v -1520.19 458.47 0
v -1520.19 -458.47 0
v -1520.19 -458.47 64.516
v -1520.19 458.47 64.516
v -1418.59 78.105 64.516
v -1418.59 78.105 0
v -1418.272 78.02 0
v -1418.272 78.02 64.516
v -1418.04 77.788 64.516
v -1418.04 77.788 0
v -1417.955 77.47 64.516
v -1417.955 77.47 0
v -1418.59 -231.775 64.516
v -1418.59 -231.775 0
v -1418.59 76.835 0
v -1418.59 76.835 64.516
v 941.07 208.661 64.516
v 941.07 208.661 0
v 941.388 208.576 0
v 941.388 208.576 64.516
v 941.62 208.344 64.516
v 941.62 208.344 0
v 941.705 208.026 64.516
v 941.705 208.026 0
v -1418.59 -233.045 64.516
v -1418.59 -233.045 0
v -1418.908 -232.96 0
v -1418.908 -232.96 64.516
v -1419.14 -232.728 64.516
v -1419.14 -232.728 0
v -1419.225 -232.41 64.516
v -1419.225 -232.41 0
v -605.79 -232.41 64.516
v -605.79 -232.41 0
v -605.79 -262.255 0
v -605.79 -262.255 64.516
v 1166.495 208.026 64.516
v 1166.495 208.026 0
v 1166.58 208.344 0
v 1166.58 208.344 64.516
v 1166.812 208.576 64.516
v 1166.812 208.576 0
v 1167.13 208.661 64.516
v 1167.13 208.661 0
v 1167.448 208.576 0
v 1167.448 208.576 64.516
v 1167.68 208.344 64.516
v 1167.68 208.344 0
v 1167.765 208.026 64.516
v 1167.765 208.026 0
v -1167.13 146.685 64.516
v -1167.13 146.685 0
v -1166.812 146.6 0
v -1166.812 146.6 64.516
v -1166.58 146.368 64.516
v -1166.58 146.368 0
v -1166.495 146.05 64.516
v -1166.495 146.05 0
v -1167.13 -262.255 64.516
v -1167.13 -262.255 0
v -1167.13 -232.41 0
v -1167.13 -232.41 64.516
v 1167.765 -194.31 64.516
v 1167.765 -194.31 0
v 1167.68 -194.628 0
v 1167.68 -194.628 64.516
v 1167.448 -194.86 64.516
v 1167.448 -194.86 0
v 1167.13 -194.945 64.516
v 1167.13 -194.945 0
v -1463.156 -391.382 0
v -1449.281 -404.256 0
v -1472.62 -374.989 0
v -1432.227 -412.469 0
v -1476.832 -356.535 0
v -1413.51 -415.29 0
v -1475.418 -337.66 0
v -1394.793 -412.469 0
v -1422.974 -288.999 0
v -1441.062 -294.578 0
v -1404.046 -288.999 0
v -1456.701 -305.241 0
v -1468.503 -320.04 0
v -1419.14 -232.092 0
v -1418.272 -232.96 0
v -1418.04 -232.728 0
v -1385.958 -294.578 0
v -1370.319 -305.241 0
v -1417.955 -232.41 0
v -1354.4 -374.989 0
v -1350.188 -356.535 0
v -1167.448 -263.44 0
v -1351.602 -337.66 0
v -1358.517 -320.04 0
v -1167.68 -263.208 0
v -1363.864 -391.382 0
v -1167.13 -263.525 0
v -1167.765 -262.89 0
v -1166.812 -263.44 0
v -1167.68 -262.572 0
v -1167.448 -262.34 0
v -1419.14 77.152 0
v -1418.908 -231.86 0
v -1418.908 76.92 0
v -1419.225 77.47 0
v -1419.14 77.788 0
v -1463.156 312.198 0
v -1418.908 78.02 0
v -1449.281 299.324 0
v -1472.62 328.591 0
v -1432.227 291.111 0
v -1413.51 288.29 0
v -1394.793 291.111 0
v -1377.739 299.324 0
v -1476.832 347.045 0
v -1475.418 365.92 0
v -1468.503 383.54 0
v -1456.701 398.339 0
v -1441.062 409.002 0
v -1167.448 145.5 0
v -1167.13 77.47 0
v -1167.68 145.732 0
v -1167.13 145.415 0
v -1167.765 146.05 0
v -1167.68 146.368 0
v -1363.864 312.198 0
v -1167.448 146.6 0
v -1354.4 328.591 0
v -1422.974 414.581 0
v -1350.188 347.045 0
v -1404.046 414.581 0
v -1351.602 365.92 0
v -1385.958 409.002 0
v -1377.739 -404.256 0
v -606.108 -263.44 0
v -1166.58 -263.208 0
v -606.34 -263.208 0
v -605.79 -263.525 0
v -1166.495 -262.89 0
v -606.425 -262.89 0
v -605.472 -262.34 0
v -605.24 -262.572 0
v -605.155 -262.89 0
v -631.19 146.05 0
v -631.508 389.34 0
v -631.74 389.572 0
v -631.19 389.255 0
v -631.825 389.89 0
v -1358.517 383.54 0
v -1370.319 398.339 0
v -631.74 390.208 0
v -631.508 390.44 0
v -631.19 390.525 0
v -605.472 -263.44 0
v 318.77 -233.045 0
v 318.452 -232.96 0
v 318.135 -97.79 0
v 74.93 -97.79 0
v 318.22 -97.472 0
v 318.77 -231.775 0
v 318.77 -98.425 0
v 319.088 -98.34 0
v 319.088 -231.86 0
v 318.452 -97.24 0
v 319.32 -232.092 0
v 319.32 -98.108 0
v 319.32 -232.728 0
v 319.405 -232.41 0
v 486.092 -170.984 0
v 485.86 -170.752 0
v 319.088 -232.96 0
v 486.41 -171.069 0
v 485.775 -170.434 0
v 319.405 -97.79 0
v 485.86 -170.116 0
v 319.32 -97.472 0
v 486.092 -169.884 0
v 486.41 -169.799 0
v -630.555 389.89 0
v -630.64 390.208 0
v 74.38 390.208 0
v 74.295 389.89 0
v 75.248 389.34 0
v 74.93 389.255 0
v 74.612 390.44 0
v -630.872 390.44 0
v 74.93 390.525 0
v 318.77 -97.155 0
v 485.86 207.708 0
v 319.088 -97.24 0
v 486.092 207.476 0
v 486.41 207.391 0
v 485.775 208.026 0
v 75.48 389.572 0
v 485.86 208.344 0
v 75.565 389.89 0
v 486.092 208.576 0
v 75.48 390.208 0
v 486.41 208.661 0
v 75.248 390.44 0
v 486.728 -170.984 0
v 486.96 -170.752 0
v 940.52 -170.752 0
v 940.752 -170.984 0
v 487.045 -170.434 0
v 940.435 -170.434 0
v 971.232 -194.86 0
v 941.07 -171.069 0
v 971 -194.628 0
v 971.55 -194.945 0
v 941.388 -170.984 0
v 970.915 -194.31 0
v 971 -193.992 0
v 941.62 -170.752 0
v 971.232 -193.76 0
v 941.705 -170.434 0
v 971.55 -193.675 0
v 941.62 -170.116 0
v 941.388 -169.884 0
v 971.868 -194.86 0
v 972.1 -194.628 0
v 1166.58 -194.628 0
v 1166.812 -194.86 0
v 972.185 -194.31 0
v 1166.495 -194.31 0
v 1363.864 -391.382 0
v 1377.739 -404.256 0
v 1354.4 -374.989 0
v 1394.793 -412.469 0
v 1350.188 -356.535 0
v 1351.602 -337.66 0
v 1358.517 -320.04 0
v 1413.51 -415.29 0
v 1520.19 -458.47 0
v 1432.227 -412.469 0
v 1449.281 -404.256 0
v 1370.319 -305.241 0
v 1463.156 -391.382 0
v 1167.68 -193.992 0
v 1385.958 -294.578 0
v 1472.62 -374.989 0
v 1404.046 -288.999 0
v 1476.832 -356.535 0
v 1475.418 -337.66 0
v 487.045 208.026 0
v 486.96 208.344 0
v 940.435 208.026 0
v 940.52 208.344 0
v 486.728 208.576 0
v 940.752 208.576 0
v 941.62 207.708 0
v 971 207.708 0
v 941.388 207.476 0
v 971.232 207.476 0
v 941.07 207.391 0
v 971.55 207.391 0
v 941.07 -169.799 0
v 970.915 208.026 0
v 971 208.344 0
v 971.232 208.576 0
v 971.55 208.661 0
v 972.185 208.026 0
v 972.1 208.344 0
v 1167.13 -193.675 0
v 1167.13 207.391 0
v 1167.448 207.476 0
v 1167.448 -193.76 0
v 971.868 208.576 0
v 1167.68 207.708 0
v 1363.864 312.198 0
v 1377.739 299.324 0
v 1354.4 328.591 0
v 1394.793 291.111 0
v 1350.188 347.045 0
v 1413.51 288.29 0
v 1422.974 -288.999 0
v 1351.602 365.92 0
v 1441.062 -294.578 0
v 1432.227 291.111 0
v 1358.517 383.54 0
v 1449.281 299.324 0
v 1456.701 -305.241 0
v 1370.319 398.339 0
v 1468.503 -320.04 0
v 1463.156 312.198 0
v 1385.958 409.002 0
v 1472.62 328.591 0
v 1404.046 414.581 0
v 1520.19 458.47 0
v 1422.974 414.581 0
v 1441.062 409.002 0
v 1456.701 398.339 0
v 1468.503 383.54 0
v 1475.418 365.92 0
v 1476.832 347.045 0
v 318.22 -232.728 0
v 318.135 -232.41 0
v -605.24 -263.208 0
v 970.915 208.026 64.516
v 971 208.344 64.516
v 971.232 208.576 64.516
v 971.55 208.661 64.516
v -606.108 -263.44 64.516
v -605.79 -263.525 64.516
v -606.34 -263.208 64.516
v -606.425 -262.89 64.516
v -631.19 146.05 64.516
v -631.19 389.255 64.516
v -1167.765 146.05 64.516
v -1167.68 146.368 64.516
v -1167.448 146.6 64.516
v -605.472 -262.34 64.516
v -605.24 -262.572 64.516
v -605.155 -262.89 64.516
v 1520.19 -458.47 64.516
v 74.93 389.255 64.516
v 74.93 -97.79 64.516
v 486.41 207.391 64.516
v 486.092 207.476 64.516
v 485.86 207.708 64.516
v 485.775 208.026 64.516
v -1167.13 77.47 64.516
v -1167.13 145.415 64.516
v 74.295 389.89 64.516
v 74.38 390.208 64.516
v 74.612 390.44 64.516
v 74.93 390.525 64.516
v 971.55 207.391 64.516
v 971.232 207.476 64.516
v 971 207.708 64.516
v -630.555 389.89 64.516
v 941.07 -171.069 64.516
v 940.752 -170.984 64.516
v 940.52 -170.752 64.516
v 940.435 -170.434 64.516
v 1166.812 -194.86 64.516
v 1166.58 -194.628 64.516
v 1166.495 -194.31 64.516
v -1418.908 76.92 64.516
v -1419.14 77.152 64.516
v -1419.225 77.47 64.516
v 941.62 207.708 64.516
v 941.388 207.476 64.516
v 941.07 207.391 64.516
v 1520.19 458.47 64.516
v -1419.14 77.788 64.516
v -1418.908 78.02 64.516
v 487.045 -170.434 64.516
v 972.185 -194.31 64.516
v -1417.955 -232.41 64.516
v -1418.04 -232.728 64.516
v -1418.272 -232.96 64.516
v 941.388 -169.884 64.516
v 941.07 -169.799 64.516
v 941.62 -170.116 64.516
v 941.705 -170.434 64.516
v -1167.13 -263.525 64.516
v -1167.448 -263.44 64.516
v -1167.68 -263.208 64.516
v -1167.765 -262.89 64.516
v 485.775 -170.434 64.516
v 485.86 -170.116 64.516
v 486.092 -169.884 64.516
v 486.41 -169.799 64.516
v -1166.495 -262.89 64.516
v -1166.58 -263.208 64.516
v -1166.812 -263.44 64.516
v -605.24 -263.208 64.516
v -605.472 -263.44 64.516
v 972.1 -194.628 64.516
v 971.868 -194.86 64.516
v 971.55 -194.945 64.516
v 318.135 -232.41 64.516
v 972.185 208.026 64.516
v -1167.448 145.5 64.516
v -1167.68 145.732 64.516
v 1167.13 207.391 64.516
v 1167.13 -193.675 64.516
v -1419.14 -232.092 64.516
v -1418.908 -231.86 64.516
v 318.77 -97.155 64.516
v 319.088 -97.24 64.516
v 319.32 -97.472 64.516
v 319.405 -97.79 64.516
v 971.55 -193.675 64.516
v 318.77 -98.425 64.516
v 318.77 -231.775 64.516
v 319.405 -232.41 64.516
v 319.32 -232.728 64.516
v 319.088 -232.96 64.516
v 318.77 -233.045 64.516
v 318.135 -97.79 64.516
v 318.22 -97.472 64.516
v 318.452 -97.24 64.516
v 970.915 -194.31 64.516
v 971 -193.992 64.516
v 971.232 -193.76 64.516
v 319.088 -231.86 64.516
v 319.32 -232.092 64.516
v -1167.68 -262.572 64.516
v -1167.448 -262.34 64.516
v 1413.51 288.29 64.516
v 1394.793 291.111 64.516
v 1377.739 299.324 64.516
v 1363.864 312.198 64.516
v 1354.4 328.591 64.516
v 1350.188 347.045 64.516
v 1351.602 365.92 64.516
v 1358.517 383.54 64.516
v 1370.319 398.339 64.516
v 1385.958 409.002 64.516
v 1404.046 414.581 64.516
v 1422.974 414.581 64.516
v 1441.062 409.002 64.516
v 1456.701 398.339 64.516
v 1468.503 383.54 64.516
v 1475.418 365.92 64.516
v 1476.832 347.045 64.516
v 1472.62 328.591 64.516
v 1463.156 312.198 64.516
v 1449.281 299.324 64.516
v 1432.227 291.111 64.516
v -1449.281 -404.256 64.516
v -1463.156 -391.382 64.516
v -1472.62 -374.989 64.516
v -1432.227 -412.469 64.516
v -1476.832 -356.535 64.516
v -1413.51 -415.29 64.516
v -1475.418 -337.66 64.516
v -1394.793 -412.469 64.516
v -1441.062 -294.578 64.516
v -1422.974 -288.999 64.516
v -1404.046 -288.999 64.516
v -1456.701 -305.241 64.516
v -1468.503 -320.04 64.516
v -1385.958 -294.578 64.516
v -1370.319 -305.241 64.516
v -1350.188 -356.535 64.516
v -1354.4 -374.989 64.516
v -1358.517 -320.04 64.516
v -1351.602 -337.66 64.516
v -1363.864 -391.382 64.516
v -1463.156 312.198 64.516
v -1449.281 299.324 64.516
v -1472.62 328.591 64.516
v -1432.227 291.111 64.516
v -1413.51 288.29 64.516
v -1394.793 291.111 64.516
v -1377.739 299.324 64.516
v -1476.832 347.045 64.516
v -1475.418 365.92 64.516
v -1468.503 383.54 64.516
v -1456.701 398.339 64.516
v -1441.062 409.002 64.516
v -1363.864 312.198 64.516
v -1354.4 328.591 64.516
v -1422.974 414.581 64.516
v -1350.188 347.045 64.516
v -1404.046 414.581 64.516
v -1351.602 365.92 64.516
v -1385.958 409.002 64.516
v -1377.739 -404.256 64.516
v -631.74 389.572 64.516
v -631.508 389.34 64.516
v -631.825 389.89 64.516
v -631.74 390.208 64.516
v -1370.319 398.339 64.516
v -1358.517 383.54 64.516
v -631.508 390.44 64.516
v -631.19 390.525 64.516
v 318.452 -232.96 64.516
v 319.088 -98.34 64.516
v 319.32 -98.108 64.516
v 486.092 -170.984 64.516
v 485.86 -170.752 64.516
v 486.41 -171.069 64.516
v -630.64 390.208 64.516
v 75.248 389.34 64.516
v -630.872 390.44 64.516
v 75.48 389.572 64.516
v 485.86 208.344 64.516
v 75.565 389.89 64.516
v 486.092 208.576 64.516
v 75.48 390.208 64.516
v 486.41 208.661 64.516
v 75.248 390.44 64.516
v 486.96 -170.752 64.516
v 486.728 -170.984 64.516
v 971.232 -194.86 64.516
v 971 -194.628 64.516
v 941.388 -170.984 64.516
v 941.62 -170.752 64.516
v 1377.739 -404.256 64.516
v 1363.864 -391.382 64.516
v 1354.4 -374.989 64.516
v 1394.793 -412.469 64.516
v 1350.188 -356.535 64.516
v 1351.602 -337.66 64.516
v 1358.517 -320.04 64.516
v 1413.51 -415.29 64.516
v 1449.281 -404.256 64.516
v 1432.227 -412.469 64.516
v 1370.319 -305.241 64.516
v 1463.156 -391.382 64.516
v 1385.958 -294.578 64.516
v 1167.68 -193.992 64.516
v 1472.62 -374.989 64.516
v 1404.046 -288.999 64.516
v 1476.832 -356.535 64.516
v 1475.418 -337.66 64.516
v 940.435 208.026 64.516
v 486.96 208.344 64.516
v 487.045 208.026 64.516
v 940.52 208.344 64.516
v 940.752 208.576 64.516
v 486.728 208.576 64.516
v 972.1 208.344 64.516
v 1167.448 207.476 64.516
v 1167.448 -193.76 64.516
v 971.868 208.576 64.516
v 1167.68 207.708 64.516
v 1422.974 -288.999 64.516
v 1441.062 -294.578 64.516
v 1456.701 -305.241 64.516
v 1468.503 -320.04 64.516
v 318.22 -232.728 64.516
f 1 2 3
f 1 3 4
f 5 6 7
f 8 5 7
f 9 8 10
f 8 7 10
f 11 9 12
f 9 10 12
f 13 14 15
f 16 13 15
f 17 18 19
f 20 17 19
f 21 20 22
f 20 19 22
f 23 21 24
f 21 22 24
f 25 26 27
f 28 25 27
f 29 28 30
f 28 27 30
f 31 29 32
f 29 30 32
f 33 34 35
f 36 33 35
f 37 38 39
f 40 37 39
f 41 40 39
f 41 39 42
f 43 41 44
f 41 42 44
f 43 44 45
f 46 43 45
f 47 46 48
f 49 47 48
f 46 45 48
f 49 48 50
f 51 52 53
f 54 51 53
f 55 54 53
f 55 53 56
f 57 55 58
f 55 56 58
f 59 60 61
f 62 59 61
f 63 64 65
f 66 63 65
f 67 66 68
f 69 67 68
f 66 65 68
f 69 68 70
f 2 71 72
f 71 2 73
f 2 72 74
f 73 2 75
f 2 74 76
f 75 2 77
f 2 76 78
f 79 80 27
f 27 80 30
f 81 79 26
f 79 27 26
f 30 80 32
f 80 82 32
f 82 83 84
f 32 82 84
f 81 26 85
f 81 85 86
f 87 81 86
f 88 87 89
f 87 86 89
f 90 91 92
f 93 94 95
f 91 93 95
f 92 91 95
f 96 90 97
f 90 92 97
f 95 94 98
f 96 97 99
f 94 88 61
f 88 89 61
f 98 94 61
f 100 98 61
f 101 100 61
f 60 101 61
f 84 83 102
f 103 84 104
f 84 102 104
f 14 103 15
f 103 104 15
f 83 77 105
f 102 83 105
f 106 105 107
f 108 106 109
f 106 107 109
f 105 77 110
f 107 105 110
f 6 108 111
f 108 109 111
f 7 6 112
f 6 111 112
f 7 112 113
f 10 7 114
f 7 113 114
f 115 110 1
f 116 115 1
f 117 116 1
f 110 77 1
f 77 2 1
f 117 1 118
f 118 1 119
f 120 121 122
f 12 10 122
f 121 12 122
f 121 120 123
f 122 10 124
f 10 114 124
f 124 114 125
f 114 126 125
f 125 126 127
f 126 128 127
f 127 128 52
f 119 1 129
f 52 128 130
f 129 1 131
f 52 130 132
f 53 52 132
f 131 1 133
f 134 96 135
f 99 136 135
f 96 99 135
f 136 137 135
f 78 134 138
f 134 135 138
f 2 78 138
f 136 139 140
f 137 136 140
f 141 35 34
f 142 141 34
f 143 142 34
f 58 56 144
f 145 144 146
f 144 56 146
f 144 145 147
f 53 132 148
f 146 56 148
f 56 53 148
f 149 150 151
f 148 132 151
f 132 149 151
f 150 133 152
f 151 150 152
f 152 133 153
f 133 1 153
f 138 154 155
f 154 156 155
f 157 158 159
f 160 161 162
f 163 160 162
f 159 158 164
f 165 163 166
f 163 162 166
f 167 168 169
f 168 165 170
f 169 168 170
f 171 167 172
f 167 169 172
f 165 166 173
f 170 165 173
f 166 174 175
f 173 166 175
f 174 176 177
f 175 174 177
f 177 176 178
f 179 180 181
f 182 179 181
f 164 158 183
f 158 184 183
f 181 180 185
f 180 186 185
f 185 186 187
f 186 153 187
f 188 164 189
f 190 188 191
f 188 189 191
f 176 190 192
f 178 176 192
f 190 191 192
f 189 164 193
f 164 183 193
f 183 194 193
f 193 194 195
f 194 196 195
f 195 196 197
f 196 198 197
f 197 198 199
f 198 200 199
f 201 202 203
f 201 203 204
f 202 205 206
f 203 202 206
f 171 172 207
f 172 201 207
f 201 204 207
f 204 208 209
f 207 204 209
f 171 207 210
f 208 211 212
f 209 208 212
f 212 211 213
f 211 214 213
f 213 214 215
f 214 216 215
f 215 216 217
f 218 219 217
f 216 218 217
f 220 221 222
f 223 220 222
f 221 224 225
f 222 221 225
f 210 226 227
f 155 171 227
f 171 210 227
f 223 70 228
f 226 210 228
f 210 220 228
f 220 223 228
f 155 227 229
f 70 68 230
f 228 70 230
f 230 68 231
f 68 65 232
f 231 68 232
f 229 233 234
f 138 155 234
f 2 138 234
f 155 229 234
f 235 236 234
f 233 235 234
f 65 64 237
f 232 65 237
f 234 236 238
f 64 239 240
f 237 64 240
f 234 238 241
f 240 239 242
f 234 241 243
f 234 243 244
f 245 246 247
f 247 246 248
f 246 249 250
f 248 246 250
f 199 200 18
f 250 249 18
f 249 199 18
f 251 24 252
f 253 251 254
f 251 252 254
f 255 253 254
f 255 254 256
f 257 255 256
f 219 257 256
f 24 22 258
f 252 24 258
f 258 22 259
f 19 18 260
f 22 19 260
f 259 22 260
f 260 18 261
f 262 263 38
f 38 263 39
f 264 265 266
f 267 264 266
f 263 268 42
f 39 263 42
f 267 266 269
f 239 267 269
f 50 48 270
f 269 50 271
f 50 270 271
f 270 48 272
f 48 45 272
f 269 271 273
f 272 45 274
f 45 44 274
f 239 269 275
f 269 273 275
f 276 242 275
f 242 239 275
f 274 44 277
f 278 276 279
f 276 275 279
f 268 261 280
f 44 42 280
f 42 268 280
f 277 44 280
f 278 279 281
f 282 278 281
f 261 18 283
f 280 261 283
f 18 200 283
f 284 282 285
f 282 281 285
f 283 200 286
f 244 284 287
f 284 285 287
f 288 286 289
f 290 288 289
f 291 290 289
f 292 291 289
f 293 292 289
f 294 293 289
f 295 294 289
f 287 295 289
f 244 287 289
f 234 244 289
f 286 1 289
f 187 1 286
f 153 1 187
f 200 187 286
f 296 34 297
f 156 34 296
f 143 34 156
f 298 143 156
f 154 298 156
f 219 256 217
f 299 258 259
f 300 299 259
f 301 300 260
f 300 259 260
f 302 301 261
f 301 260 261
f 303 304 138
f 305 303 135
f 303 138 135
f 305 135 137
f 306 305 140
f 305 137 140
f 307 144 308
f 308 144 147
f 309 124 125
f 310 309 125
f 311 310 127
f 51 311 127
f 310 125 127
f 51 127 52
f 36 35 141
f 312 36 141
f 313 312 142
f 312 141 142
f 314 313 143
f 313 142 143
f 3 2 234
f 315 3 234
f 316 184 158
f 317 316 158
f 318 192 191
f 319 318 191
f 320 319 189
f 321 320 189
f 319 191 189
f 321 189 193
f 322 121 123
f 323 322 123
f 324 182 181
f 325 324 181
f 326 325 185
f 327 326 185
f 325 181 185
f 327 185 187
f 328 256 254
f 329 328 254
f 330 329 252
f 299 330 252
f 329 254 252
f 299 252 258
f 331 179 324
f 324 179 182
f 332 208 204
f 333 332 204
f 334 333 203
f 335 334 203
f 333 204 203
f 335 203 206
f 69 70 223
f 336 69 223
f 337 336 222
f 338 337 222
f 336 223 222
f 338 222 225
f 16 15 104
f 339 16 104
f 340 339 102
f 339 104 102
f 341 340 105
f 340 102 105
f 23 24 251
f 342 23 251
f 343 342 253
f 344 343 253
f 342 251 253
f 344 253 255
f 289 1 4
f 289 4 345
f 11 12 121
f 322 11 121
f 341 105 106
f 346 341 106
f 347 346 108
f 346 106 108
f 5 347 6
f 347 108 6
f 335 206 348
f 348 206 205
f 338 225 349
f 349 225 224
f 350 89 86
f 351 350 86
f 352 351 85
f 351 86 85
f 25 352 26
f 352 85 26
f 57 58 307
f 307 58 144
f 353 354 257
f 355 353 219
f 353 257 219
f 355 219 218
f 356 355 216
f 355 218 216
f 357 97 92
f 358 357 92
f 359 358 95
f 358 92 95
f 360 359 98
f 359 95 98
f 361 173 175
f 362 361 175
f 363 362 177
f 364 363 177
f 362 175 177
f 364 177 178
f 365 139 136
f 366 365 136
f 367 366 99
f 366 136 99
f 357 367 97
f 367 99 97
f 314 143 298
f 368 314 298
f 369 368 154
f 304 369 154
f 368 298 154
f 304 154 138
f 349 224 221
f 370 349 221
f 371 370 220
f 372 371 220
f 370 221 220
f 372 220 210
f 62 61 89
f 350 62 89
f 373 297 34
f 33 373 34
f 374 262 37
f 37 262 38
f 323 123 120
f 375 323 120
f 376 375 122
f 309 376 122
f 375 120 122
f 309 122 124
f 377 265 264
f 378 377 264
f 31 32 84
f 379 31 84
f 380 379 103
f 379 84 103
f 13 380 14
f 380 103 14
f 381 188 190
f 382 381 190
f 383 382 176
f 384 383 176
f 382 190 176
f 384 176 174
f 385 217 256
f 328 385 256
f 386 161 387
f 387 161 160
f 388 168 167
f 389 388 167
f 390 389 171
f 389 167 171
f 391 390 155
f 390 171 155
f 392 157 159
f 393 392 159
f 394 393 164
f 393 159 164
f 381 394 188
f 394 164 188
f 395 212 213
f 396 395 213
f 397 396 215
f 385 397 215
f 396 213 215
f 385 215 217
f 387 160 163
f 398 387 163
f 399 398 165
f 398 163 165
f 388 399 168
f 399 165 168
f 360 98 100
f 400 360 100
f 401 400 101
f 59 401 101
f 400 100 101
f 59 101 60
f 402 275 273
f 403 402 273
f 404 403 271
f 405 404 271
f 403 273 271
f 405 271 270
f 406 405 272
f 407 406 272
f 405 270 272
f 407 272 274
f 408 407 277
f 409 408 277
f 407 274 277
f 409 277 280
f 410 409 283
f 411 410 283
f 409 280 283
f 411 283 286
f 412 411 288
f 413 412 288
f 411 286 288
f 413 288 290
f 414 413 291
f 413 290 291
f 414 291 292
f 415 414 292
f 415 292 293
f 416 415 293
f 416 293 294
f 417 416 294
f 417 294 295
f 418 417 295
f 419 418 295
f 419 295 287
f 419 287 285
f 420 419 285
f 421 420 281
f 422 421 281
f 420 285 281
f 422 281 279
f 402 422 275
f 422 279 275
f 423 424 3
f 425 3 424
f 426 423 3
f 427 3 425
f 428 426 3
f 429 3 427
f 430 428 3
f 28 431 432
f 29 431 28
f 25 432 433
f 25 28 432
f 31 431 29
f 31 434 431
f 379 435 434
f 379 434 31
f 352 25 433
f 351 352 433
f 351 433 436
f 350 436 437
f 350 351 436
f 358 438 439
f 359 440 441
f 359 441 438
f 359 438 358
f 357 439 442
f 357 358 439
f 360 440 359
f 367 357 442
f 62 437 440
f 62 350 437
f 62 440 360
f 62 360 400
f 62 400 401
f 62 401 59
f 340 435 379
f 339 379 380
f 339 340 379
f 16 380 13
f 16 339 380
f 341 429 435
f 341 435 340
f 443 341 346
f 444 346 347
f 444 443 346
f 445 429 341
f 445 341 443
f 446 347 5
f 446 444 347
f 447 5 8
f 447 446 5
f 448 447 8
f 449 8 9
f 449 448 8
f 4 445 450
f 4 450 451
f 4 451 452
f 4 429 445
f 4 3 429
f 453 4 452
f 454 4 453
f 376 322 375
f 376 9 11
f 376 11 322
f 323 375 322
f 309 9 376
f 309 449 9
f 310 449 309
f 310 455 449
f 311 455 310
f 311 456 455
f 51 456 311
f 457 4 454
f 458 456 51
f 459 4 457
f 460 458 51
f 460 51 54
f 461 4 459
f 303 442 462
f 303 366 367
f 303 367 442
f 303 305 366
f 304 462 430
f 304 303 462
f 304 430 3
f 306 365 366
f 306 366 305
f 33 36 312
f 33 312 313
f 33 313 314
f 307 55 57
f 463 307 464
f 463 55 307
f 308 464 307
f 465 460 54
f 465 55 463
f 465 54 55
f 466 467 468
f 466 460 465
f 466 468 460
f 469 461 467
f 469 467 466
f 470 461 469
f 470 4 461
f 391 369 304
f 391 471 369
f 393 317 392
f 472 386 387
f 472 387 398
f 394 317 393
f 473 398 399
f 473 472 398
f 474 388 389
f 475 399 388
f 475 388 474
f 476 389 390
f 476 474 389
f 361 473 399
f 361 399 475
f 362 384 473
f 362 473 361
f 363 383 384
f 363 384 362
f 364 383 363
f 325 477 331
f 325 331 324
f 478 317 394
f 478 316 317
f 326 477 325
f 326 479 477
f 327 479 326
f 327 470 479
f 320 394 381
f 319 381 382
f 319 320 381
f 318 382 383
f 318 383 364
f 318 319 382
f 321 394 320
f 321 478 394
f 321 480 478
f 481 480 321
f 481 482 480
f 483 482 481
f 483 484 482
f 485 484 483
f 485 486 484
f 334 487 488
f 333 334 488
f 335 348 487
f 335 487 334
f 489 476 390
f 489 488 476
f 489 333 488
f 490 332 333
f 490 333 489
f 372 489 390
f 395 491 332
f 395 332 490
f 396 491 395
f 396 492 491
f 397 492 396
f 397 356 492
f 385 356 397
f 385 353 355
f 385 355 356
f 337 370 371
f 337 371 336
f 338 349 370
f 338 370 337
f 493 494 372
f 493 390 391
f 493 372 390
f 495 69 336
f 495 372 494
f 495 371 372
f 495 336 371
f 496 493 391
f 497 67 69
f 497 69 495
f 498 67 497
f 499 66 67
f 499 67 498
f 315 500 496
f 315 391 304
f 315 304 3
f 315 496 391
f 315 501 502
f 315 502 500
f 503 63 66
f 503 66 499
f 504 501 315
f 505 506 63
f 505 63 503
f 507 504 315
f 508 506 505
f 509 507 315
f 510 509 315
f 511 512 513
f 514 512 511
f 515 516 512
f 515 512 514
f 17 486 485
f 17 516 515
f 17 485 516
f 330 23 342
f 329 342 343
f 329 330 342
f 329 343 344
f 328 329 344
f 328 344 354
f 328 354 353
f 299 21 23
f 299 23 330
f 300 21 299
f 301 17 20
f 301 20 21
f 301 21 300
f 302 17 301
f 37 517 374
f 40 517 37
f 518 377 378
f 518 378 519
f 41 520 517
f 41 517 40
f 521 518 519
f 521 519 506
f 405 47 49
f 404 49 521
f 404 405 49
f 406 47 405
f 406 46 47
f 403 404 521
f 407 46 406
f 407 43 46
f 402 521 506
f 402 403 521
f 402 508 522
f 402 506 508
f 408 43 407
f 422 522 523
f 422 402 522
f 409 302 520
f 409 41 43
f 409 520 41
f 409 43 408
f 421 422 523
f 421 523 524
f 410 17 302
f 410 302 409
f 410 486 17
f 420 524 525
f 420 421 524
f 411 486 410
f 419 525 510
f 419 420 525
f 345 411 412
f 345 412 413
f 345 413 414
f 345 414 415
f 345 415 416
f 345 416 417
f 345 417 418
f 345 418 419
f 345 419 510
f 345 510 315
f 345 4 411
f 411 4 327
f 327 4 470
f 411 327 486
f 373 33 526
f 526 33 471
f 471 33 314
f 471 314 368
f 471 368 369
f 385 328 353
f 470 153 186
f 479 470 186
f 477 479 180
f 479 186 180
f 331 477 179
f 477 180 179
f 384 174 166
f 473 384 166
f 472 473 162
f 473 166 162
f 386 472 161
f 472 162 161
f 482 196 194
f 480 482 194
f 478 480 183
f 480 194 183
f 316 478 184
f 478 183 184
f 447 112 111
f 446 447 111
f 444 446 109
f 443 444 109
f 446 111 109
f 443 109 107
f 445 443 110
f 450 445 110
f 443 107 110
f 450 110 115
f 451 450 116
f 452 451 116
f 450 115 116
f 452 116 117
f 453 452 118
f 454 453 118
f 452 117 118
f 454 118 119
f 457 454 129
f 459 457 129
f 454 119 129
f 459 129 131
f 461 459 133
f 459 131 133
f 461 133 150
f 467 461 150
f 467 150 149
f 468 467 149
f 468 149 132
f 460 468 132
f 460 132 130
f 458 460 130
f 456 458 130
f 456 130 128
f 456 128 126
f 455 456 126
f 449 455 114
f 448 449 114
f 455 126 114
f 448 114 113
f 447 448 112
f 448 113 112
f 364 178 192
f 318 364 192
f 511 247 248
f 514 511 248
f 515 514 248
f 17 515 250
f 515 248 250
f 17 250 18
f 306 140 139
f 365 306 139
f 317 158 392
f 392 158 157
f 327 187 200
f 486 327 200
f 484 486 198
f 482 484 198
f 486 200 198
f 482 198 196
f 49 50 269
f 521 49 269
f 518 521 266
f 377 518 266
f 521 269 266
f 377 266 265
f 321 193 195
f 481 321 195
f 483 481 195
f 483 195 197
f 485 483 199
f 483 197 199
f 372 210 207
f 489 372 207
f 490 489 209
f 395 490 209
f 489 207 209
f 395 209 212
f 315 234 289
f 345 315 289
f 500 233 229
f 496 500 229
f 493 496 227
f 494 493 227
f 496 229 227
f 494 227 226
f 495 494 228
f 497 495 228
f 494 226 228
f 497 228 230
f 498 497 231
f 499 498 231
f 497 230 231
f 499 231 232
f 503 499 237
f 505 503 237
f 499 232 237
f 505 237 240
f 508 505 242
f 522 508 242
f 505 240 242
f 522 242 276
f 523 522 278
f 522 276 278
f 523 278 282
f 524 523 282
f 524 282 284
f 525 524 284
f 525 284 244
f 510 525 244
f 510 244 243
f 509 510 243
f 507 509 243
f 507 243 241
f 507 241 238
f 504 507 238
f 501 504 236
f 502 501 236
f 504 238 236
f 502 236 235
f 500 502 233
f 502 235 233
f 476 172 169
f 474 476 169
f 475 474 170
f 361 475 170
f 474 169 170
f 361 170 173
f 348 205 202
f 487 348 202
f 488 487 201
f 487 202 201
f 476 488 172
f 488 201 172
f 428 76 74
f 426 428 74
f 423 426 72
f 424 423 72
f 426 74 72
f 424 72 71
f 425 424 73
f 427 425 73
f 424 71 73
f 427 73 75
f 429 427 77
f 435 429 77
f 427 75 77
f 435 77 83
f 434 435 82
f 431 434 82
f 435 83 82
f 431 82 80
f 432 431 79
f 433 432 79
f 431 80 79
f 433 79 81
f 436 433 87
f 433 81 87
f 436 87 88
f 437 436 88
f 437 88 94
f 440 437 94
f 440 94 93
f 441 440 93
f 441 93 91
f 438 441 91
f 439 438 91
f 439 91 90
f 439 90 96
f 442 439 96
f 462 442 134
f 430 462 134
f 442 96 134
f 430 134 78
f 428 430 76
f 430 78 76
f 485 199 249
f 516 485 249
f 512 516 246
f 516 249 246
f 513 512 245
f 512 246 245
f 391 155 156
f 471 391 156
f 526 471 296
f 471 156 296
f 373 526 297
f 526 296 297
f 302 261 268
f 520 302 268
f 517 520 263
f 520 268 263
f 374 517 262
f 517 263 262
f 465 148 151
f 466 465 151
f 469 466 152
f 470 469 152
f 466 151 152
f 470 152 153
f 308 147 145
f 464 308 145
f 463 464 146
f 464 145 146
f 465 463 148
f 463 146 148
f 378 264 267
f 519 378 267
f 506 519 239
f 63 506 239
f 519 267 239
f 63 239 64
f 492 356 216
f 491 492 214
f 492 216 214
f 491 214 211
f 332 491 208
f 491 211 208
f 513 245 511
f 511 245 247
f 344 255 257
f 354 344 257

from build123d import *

# Parameters (mm, degrees)
F0_W     = 3040.38
F0_H     = 916.94
F1_DEPTH = 64.516


with BuildPart() as f1:
    # F0 (on Top) → F1 (new body)
    with BuildSketch(Plane.XY):
        Rectangle(F0_W, F0_H)
        with BuildLine():
            ThreePointArc((-1413.51, -288.29), (-1350.01, -351.79), (-1413.51, -415.29))
            ThreePointArc((-1413.51, -415.29), (-1477.01, -351.79), (-1413.51, -288.29))
        make_face(mode=Mode.SUBTRACT)
        with BuildLine():
            ThreePointArc((1413.51, -288.29), (1477.01, -351.79), (1413.51, -415.29))
            ThreePointArc((1413.51, -415.29), (1350.01, -351.79), (1413.51, -288.29))
        make_face(mode=Mode.SUBTRACT)
        with BuildLine():
            Line((-1167.765, -232.41), (-1417.955, -232.41))
            ThreePointArc((-1417.955, -232.41), (-1418.140987, -232.859013), (-1418.59, -233.045))
            ThreePointArc((-1418.59, -233.045), (-1419.039013, -232.859013), (-1419.225, -232.41))
            ThreePointArc((-1419.225, -232.41), (-1419.039013, -231.960987), (-1418.59, -231.775))
            Line((-1418.59, -231.775), (-1418.59, 76.835))
            ThreePointArc((-1418.59, 76.835), (-1419.039013, 77.020987), (-1419.225, 77.47))
            ThreePointArc((-1419.225, 77.47), (-1419.039013, 77.919013), (-1418.59, 78.105))
            ThreePointArc((-1418.59, 78.105), (-1418.140987, 77.919013), (-1417.955, 77.47))
            Line((-1417.955, 77.47), (-1167.765, 77.47))
            Line((-1167.765, 77.47), (-1167.13, 77.47))
            Line((-1167.13, 77.47), (-1167.13, 78.105))
            Line((-1167.13, 78.105), (-1167.13, 145.415))
            ThreePointArc((-1167.13, 145.415), (-1167.579013, 145.600987), (-1167.765, 146.05))
            ThreePointArc((-1167.765, 146.05), (-1167.579013, 146.499013), (-1167.13, 146.685))
            ThreePointArc((-1167.13, 146.685), (-1166.680987, 146.499013), (-1166.495, 146.05))
            Line((-1166.495, 146.05), (-631.825, 146.05))
            Line((-631.825, 146.05), (-631.19, 146.05))
            Line((-631.19, 146.05), (-631.19, 146.685))
            Line((-631.19, 146.685), (-631.19, 389.255))
            ThreePointArc((-631.19, 389.255), (-631.639013, 389.440987), (-631.825, 389.89))
            ThreePointArc((-631.825, 389.89), (-631.639013, 390.339013), (-631.19, 390.525))
            ThreePointArc((-631.19, 390.525), (-630.740987, 390.339013), (-630.555, 389.89))
            Line((-630.555, 389.89), (74.295, 389.89))
            ThreePointArc((74.295, 389.89), (74.480987, 390.339013), (74.93, 390.525))
            ThreePointArc((74.93, 390.525), (75.379013, 390.339013), (75.565, 389.89))
            ThreePointArc((75.565, 389.89), (75.379013, 389.440987), (74.93, 389.255))
            Line((74.93, 389.255), (74.93, -97.155))
            Line((74.93, -97.155), (74.93, -97.79))
            Line((74.93, -97.79), (75.565, -97.79))
            Line((75.565, -97.79), (318.135, -97.79))
            ThreePointArc((318.135, -97.79), (318.320987, -97.340987), (318.77, -97.155))
            ThreePointArc((318.77, -97.155), (319.219013, -97.340987), (319.405, -97.79))
            ThreePointArc((319.405, -97.79), (319.219013, -98.239013), (318.77, -98.425))
            Line((318.77, -98.425), (318.77, -231.775))
            ThreePointArc((318.77, -231.775), (319.219013, -231.960987), (319.405, -232.41))
            ThreePointArc((319.405, -232.41), (319.219013, -232.859013), (318.77, -233.045))
            ThreePointArc((318.77, -233.045), (318.320987, -232.859013), (318.135, -232.41))
            Line((318.135, -232.41), (-605.155, -232.41))
            Line((-605.155, -232.41), (-605.79, -232.41))
            Line((-605.79, -232.41), (-605.79, -233.045))
            Line((-605.79, -233.045), (-605.79, -262.255))
            ThreePointArc((-605.79, -262.255), (-605.340987, -262.440987), (-605.155, -262.89))
            ThreePointArc((-605.155, -262.89), (-605.340987, -263.339013), (-605.79, -263.525))
            ThreePointArc((-605.79, -263.525), (-606.239013, -263.339013), (-606.425, -262.89))
            Line((-606.425, -262.89), (-1166.495, -262.89))
            ThreePointArc((-1166.495, -262.89), (-1166.680987, -263.339013), (-1167.13, -263.525))
            ThreePointArc((-1167.13, -263.525), (-1167.579013, -263.339013), (-1167.765, -262.89))
            ThreePointArc((-1167.765, -262.89), (-1167.579013, -262.440987), (-1167.13, -262.255))
            Line((-1167.13, -262.255), (-1167.13, -233.045))
            Line((-1167.13, -233.045), (-1167.13, -232.41))
            Line((-1167.13, -232.41), (-1167.765, -232.41))
        make_face(mode=Mode.SUBTRACT)
        with BuildLine():
            ThreePointArc((-1413.51, 415.29), (-1350.01, 351.79), (-1413.51, 288.29))
            ThreePointArc((-1413.51, 288.29), (-1477.01, 351.79), (-1413.51, 415.29))
        make_face(mode=Mode.SUBTRACT)
        with BuildLine():
            Line((940.435, -170.434), (487.045, -170.434))
            ThreePointArc((487.045, -170.434), (486.859013, -170.883013), (486.41, -171.069))
            ThreePointArc((486.41, -171.069), (485.960987, -170.883013), (485.775, -170.434))
            ThreePointArc((485.775, -170.434), (485.960987, -169.984987), (486.41, -169.799))
            Line((486.41, -169.799), (486.41, 207.391))
            ThreePointArc((486.41, 207.391), (485.960987, 207.576987), (485.775, 208.026))
            ThreePointArc((485.775, 208.026), (485.960987, 208.475013), (486.41, 208.661))
            ThreePointArc((486.41, 208.661), (486.859013, 208.475013), (487.045, 208.026))
            Line((487.045, 208.026), (940.435, 208.026))
            ThreePointArc((940.435, 208.026), (940.620987, 208.475013), (941.07, 208.661))
            ThreePointArc((941.07, 208.661), (941.519013, 208.475013), (941.705, 208.026))
            ThreePointArc((941.705, 208.026), (941.519013, 207.576987), (941.07, 207.391))
            Line((941.07, 207.391), (941.07, -169.799))
            ThreePointArc((941.07, -169.799), (941.519013, -169.984987), (941.705, -170.434))
            ThreePointArc((941.705, -170.434), (941.519013, -170.883013), (941.07, -171.069))
            ThreePointArc((941.07, -171.069), (940.620987, -170.883013), (940.435, -170.434))
        make_face(mode=Mode.SUBTRACT)
        with BuildLine():
            Line((1166.495, -194.31), (972.185, -194.31))
            ThreePointArc((972.185, -194.31), (971.999013, -194.759013), (971.55, -194.945))
            ThreePointArc((971.55, -194.945), (971.100987, -194.759013), (970.915, -194.31))
            ThreePointArc((970.915, -194.31), (971.100987, -193.860987), (971.55, -193.675))
            Line((971.55, -193.675), (971.55, 207.391))
            ThreePointArc((971.55, 207.391), (971.100987, 207.576987), (970.915, 208.026))
            ThreePointArc((970.915, 208.026), (971.100987, 208.475013), (971.55, 208.661))
            ThreePointArc((971.55, 208.661), (971.999013, 208.475013), (972.185, 208.026))
            Line((972.185, 208.026), (1166.495, 208.026))
            ThreePointArc((1166.495, 208.026), (1166.680987, 208.475013), (1167.13, 208.661))
            ThreePointArc((1167.13, 208.661), (1167.579013, 208.475013), (1167.765, 208.026))
            ThreePointArc((1167.765, 208.026), (1167.579013, 207.576987), (1167.13, 207.391))
            Line((1167.13, 207.391), (1167.13, -193.675))
            ThreePointArc((1167.13, -193.675), (1167.579013, -193.860987), (1167.765, -194.31))
            ThreePointArc((1167.765, -194.31), (1167.579013, -194.759013), (1167.13, -194.945))
            ThreePointArc((1167.13, -194.945), (1166.680987, -194.759013), (1166.495, -194.31))
        make_face(mode=Mode.SUBTRACT)
        with BuildLine():
            ThreePointArc((1413.51, 415.29), (1477.01, 351.79), (1413.51, 288.29))
            ThreePointArc((1413.51, 288.29), (1350.01, 351.79), (1413.51, 415.29))
        make_face(mode=Mode.SUBTRACT)
    extrude(amount=F1_DEPTH)


solid = f1.part
